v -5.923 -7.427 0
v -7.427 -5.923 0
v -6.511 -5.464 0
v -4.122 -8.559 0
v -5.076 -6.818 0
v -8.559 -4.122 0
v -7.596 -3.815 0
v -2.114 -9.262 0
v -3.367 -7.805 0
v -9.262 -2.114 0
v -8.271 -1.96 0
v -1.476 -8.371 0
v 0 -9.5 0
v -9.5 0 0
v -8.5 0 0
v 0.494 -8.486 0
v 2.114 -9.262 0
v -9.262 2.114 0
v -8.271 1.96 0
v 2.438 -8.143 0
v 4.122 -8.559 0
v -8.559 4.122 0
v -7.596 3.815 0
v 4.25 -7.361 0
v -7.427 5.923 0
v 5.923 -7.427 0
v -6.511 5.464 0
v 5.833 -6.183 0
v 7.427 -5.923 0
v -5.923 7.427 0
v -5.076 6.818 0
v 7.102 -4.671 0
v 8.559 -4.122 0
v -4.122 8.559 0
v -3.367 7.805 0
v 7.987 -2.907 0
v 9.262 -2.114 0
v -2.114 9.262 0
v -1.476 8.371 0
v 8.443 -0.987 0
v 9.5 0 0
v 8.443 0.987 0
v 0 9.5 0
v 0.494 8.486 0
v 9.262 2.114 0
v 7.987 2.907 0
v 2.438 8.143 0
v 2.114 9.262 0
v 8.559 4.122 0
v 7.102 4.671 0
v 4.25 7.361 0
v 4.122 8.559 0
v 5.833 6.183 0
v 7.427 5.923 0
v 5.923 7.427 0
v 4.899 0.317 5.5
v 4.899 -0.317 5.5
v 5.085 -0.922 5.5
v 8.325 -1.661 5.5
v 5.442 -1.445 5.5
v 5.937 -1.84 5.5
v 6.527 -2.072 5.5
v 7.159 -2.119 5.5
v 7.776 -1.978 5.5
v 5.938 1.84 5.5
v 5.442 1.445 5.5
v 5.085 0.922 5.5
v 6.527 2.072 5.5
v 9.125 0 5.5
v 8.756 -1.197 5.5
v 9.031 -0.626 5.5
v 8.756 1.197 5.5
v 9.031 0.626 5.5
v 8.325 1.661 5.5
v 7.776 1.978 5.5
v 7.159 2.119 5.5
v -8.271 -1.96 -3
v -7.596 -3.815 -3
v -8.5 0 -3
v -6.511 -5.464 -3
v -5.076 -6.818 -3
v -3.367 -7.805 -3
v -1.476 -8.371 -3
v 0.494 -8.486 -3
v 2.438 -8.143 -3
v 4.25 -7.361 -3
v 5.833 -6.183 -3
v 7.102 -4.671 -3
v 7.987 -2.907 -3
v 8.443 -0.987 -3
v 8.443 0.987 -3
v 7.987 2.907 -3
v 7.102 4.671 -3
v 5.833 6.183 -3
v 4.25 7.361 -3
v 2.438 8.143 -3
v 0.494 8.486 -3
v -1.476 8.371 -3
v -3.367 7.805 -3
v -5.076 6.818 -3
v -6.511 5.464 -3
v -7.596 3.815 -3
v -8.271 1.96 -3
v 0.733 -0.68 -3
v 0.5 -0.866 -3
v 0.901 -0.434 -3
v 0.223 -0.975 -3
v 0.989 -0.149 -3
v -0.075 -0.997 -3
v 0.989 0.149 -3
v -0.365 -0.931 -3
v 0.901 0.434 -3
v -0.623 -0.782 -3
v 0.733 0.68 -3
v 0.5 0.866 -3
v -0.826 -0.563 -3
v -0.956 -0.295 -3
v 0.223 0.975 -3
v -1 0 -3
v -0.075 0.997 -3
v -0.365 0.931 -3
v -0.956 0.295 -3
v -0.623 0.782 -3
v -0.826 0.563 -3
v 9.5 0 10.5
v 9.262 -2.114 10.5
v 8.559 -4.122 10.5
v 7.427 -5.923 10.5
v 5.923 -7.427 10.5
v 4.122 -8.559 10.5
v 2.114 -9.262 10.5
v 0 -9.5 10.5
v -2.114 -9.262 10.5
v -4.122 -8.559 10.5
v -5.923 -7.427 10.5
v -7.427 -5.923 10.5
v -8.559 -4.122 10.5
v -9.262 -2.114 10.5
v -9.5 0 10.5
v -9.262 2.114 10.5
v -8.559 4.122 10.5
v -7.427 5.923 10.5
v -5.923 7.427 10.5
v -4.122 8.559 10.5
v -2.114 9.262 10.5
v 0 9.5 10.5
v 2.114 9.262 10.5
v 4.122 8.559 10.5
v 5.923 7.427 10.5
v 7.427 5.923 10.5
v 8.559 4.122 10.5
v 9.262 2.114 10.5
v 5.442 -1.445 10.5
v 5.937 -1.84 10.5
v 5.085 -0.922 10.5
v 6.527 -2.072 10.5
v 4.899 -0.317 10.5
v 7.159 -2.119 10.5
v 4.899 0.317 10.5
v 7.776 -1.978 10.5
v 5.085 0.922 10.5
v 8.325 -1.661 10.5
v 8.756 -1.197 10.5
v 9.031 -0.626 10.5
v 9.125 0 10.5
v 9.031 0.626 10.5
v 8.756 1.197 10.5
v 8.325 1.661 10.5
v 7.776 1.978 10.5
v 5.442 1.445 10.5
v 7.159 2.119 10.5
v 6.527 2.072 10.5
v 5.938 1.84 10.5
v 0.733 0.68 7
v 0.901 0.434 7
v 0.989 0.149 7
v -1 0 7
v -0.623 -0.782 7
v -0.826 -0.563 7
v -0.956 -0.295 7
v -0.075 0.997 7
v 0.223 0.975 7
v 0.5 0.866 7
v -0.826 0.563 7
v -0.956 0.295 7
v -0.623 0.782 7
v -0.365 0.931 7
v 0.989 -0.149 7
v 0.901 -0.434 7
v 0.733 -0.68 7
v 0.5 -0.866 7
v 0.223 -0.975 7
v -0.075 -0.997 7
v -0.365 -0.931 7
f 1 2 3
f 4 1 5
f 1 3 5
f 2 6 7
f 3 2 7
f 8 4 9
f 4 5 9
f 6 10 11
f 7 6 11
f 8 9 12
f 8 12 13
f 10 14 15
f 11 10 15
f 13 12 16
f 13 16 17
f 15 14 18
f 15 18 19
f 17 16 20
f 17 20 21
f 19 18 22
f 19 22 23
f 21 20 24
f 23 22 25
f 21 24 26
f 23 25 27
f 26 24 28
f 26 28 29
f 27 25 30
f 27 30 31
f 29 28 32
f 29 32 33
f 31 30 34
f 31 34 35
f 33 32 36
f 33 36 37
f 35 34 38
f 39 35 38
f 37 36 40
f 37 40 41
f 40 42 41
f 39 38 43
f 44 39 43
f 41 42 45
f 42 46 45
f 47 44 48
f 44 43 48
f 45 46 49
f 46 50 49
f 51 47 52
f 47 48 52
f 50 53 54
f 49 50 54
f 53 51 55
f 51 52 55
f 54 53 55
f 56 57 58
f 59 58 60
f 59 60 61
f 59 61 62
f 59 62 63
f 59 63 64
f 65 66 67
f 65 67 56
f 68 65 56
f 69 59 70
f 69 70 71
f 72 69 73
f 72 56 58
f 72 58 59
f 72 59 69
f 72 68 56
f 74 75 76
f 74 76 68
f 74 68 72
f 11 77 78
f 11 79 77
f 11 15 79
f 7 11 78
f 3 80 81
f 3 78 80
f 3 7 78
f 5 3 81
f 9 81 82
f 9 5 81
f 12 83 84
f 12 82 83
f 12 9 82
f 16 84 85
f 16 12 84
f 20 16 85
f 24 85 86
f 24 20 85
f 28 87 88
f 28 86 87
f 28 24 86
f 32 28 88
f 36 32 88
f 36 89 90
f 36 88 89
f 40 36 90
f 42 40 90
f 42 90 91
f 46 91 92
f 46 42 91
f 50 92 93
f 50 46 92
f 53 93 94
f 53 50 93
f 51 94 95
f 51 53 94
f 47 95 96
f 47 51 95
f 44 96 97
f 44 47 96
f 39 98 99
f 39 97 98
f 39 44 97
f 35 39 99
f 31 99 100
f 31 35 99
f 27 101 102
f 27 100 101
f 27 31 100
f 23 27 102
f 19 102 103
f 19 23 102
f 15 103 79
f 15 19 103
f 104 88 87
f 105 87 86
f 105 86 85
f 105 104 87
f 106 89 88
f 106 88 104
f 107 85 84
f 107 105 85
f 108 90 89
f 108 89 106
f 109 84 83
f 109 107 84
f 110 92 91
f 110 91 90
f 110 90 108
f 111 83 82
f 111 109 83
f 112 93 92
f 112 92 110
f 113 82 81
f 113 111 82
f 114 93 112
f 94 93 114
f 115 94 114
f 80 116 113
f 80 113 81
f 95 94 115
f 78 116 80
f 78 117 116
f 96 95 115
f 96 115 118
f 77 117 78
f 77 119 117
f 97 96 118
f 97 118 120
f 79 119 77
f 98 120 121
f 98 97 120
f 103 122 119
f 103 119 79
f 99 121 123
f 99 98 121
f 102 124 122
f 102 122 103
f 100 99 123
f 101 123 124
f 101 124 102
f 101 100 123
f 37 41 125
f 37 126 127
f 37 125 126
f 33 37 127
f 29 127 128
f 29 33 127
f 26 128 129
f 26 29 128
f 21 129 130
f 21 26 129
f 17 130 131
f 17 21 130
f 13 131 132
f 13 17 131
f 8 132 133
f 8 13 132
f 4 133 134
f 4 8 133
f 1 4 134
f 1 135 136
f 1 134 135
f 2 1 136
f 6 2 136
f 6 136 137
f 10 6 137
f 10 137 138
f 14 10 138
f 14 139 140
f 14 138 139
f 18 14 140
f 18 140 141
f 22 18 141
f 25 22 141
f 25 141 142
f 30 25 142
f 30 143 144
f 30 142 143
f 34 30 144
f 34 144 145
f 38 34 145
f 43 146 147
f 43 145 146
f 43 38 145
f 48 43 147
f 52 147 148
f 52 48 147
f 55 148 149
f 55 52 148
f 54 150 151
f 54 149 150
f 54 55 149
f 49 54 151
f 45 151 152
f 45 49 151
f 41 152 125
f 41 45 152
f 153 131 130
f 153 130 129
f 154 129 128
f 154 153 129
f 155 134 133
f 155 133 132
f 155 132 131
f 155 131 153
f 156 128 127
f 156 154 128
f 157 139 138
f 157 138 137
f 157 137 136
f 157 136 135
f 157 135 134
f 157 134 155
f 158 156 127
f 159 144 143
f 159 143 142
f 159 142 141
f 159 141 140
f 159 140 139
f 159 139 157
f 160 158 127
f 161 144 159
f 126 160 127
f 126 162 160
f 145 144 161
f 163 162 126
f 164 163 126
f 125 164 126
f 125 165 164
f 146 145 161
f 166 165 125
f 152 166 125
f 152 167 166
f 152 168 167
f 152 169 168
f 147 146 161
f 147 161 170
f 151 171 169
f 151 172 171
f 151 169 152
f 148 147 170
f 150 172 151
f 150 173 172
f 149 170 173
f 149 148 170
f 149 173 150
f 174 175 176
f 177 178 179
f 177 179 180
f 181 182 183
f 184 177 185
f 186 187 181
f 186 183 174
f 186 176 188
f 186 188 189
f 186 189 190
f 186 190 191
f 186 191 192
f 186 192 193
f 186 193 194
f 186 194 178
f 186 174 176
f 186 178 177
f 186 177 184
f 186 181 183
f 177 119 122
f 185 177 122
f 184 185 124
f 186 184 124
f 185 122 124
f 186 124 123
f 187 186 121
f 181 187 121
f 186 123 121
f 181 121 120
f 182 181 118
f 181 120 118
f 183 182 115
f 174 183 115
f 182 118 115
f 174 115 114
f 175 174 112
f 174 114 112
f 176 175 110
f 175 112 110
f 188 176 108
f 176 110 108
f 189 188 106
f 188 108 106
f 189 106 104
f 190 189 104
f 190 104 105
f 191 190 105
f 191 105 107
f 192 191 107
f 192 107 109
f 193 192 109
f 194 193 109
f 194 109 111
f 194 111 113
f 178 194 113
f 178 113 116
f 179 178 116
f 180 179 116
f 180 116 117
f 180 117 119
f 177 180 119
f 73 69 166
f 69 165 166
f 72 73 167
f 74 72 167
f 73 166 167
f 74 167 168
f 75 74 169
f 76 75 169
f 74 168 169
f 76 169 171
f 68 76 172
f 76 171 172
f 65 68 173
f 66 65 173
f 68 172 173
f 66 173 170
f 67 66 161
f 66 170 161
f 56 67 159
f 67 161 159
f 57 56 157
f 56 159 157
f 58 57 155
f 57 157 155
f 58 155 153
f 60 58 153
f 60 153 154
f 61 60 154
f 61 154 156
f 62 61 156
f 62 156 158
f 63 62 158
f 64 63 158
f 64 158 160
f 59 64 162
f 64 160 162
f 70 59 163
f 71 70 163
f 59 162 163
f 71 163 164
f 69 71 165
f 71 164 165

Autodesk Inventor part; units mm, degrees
ref_plane "YZ Plane" through (0, 0, 0) normal (1, 0, 0) x (0, 1, 0)
ref_plane "XZ Plane" through (0, 0, 0) normal (0, 1, 0) x (-1, 0, 0)
ref_plane "XY Plane" through (0, 0, 0) normal (0, 0, 1) x (1, 0, 0)
sketch "Sketch1" plane through (0, 0, 0) normal (0, 0, 1) x (1, 0, 0)
  circle A0 centre (0, 0) radius 9.5
  arc A1 (-3.096, -4.5458) -> (5.2116, 1.7576) centre (0, 0) ccw projected
  point P0 (0, 0)
  dimension "d0" = 19
extrude "Extrusion1" add sketch "Sketch1" along normal blind 10.5
sketch "Sketch2" plane through (0, 0, 10.5) normal (0, 0, 1) x (1, 0, 0)
  circle A0 centre (0, 0) radius 9.5 projected
  line L0 (9.5, 0) -> (7, 0)
  circle A1 centre (7, 0) radius 2.125
  point P0 (0, 0)
  dimension "d3" = 2.5
  dimension "d4" = 4.25
extrude "Extrusion2" cut sketch "Sketch2" against normal blind 5 contours A1
sketch "Sketch3" plane through (0, 0, 0) normal (0, 0, -1) x (-1, 0, 0)
  circle A0 centre (0, 0) radius 5 projected
  circle A1 centre (0, 0) radius 9.5 projected
  circle A2 centre (0, 0) radius 8.5
  point P0 (0, 0)
  dimension "d7" = 17
extrude "Extrusion3" add sketch "Sketch3" along normal blind 3 contours A0 | A2
sketch "Sketch5" plane through (0, 0, -3) normal (0, 0, -1) x (-1, 0, 0)
  circle A0 centre (0, 0) radius 1
  dimension "d13" = 2
extrude "Extrusion5" cut sketch "Sketch5" against normal blind 10
properties part number "RotationDisk"
